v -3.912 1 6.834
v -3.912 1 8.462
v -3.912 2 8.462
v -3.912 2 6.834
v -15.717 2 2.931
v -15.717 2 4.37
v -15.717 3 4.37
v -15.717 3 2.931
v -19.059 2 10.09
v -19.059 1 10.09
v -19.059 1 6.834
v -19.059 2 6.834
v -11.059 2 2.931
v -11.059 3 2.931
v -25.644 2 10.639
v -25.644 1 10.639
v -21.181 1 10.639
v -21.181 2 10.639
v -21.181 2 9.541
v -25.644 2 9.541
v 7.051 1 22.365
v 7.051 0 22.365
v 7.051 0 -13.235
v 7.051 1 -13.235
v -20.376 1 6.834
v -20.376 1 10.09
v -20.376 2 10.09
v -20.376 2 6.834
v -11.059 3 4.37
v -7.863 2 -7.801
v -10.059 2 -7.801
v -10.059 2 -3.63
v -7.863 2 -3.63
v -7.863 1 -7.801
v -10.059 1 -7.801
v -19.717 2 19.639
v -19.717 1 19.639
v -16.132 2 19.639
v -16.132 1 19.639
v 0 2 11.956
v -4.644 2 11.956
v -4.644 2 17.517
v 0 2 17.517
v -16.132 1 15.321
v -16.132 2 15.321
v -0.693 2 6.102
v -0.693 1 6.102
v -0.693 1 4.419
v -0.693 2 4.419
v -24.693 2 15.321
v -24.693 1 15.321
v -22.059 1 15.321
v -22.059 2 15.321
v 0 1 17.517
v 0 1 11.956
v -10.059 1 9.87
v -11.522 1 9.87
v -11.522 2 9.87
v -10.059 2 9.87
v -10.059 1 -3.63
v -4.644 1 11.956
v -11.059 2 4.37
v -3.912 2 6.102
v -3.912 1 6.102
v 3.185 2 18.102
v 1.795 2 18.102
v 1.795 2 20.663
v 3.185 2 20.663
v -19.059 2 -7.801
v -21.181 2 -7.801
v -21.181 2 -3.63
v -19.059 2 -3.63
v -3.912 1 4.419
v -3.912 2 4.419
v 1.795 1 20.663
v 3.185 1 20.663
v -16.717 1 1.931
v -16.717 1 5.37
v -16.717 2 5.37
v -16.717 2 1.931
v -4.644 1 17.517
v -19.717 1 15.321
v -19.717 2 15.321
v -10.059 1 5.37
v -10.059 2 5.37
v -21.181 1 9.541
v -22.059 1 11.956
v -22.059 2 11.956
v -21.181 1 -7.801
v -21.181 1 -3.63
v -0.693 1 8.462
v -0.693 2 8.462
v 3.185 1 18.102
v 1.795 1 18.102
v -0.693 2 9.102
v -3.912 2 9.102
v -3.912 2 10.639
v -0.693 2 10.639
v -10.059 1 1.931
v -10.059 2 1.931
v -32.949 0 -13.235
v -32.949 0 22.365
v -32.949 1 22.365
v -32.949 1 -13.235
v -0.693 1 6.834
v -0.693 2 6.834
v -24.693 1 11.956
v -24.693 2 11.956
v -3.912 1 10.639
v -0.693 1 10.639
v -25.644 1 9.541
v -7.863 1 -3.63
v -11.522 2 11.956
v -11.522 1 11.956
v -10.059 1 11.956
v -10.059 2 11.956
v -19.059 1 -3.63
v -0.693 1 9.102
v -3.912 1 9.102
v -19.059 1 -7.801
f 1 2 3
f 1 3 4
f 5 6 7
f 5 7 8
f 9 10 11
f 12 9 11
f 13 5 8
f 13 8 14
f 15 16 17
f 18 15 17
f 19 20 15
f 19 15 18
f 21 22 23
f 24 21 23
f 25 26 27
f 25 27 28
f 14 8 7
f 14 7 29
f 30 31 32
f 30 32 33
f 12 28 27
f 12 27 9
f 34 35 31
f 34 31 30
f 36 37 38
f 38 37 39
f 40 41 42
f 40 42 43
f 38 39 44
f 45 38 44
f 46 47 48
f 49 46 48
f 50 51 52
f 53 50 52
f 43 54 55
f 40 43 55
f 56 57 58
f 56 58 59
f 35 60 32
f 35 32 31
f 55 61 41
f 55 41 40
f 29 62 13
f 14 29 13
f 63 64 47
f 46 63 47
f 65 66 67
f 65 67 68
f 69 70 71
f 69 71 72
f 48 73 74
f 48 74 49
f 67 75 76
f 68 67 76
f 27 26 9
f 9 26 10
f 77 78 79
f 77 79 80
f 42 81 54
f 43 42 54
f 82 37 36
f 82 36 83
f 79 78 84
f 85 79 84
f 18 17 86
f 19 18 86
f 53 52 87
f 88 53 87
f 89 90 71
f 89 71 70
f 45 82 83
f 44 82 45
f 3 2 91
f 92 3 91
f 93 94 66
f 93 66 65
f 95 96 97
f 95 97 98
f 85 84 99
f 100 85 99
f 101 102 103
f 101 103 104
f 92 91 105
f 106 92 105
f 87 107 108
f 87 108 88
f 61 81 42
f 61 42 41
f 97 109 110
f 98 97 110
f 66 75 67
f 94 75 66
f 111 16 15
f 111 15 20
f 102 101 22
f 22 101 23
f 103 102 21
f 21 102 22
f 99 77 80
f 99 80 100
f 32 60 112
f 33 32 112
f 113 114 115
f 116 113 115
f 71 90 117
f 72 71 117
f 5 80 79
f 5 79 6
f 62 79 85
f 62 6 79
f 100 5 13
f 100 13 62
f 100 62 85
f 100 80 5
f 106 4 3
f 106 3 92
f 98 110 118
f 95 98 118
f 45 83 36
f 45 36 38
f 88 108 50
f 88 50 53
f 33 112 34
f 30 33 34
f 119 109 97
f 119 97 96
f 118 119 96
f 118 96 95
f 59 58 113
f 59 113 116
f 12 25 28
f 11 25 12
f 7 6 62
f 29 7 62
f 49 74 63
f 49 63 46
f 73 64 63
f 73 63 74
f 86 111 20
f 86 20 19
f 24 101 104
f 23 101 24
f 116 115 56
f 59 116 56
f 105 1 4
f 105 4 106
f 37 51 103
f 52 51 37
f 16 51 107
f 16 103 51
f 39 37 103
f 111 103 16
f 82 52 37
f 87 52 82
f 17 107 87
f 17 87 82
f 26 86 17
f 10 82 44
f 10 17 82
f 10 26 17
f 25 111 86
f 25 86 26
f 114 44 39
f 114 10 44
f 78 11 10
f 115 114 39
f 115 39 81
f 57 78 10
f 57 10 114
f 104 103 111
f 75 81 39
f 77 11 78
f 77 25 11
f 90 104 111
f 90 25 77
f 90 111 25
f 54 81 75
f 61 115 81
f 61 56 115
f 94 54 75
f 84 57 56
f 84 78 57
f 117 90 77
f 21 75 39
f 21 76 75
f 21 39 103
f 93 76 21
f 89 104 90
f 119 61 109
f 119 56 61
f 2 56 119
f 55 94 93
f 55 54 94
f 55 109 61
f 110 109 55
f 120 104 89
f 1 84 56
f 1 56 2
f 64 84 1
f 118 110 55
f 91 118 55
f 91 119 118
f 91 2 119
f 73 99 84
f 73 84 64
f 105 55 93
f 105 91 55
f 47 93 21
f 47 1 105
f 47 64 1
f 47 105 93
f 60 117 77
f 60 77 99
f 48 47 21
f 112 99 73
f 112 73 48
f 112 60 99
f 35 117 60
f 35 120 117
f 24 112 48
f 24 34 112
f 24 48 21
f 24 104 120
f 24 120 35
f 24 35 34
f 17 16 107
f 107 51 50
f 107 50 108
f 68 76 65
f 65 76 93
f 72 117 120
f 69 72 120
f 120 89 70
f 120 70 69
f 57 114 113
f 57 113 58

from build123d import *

# Parameters (mm, degrees)
CROQUIS1_W              = 40
CROQUIS1_H              = 35.6
SALIENTE_EXTRUIR1_DEPTH = 1
CROQUIS2_W              = 6.658598016
CROQUIS2_H              = 3.439056118
CROQUIS2_W_2            = 4.643913986
CROQUIS2_H_2            = 5.561026915
CROQUIS2_W_3            = 2.634170644
CROQUIS2_H_3            = 3.365884712
CROQUIS2_W_4            = 4.463455813
CROQUIS2_H_4            = 1.097571101
CROQUIS2_W_5            = 1.317085322
CROQUIS2_H_5            = 3.256127602
CROQUIS2_W_6            = 3.585398932
CROQUIS2_H_6            = 4.317112999
CROQUIS2_W_7            = 2.121970796
CROQUIS2_H_7            = 4.170770186
CROQUIS2_W_8            = 2.195142203
CROQUIS2_W_9            = 1.390256729
CROQUIS2_H_8            = 2.560999237
CROQUIS2_W_10           = 3.219541898
CROQUIS2_H_9            = 1.536599542
CROQUIS2_H_10           = 1.628063801
CROQUIS2_H_11           = 1.682942356
CROQUIS2_W_11           = 1.463428135
CROQUIS2_H_12           = 2.085385093
SALIENTE_EXTRUIR2_DEPTH = 1
CROQUIS3_W              = 4.658598016
CROQUIS3_H              = 1.439056118
SALIENTE_EXTRUIR3_DEPTH = 1


with BuildPart() as part:
    # Croquis1 → Saliente-Extruir1 (new body)
    with BuildSketch(Plane(origin=(0, 0, 0), x_dir=(1, 0, 0), z_dir=(0, 1, 0))):
        with Locations((-12.948868654, -4.565292662)):
            Rectangle(CROQUIS1_W, CROQUIS1_H)
    extrude(amount=SALIENTE_EXTRUIR1_DEPTH)

    # Croquis2 → Saliente-Extruir2 (add)
    with BuildSketch(Plane(origin=(0, 1, 0), x_dir=(1, 0, 0), z_dir=(0, 1, 0))):
        with Locations((-13.387897095, -3.650650078)):
            Rectangle(CROQUIS2_W, CROQUIS2_H)
        with Locations((-2.321956993, -14.736118204)):
            Rectangle(CROQUIS2_W_2, CROQUIS2_H_2)
        with Locations((-23.375794119, -13.638547102)):
            Rectangle(CROQUIS2_W_3, CROQUIS2_H_3)
        with Locations((-23.412379823, -10.089733874)):
            Rectangle(CROQUIS2_W_4, CROQUIS2_H_4)
        with Locations((-19.717223781, -8.461670073)):
            Rectangle(CROQUIS2_W_5, CROQUIS2_H_5)
        with Locations((-17.924524315, -17.480045957)):
            Rectangle(CROQUIS2_W_6, CROQUIS2_H_6)
        with Locations((-20.119666518, 5.715289989)):
            Rectangle(CROQUIS2_W_7, CROQUIS2_H_7)
        with Locations((-8.961026986, 5.715289989)):
            Rectangle(CROQUIS2_W_8, CROQUIS2_H_7)
        with Locations((2.490298175, -19.382502534)):
            Rectangle(CROQUIS2_W_9, CROQUIS2_H_8)
        with Locations((-2.302428969, -9.870219653)):
            Rectangle(CROQUIS2_W_10, CROQUIS2_H_9)
        with Locations((-2.302428969, -7.647638173)):
            Rectangle(CROQUIS2_W_10, CROQUIS2_H_10)
        with Locations((-2.302428969, -5.260421027)):
            Rectangle(CROQUIS2_W_10, CROQUIS2_H_11)
        with Locations((-10.790312155, -10.9129122)):
            Rectangle(CROQUIS2_W_11, CROQUIS2_H_12)
    extrude(amount=SALIENTE_EXTRUIR2_DEPTH)

    # Croquis3 → Saliente-Extruir3 (add)
    with BuildSketch(Plane(origin=(0, 2, 0), x_dir=(1, 0, 0), z_dir=(0, 1, 0))):
        with Locations((-13.387897095, -3.650650078)):
            Rectangle(CROQUIS3_W, CROQUIS3_H)
    extrude(amount=SALIENTE_EXTRUIR3_DEPTH)


solid = part.part
